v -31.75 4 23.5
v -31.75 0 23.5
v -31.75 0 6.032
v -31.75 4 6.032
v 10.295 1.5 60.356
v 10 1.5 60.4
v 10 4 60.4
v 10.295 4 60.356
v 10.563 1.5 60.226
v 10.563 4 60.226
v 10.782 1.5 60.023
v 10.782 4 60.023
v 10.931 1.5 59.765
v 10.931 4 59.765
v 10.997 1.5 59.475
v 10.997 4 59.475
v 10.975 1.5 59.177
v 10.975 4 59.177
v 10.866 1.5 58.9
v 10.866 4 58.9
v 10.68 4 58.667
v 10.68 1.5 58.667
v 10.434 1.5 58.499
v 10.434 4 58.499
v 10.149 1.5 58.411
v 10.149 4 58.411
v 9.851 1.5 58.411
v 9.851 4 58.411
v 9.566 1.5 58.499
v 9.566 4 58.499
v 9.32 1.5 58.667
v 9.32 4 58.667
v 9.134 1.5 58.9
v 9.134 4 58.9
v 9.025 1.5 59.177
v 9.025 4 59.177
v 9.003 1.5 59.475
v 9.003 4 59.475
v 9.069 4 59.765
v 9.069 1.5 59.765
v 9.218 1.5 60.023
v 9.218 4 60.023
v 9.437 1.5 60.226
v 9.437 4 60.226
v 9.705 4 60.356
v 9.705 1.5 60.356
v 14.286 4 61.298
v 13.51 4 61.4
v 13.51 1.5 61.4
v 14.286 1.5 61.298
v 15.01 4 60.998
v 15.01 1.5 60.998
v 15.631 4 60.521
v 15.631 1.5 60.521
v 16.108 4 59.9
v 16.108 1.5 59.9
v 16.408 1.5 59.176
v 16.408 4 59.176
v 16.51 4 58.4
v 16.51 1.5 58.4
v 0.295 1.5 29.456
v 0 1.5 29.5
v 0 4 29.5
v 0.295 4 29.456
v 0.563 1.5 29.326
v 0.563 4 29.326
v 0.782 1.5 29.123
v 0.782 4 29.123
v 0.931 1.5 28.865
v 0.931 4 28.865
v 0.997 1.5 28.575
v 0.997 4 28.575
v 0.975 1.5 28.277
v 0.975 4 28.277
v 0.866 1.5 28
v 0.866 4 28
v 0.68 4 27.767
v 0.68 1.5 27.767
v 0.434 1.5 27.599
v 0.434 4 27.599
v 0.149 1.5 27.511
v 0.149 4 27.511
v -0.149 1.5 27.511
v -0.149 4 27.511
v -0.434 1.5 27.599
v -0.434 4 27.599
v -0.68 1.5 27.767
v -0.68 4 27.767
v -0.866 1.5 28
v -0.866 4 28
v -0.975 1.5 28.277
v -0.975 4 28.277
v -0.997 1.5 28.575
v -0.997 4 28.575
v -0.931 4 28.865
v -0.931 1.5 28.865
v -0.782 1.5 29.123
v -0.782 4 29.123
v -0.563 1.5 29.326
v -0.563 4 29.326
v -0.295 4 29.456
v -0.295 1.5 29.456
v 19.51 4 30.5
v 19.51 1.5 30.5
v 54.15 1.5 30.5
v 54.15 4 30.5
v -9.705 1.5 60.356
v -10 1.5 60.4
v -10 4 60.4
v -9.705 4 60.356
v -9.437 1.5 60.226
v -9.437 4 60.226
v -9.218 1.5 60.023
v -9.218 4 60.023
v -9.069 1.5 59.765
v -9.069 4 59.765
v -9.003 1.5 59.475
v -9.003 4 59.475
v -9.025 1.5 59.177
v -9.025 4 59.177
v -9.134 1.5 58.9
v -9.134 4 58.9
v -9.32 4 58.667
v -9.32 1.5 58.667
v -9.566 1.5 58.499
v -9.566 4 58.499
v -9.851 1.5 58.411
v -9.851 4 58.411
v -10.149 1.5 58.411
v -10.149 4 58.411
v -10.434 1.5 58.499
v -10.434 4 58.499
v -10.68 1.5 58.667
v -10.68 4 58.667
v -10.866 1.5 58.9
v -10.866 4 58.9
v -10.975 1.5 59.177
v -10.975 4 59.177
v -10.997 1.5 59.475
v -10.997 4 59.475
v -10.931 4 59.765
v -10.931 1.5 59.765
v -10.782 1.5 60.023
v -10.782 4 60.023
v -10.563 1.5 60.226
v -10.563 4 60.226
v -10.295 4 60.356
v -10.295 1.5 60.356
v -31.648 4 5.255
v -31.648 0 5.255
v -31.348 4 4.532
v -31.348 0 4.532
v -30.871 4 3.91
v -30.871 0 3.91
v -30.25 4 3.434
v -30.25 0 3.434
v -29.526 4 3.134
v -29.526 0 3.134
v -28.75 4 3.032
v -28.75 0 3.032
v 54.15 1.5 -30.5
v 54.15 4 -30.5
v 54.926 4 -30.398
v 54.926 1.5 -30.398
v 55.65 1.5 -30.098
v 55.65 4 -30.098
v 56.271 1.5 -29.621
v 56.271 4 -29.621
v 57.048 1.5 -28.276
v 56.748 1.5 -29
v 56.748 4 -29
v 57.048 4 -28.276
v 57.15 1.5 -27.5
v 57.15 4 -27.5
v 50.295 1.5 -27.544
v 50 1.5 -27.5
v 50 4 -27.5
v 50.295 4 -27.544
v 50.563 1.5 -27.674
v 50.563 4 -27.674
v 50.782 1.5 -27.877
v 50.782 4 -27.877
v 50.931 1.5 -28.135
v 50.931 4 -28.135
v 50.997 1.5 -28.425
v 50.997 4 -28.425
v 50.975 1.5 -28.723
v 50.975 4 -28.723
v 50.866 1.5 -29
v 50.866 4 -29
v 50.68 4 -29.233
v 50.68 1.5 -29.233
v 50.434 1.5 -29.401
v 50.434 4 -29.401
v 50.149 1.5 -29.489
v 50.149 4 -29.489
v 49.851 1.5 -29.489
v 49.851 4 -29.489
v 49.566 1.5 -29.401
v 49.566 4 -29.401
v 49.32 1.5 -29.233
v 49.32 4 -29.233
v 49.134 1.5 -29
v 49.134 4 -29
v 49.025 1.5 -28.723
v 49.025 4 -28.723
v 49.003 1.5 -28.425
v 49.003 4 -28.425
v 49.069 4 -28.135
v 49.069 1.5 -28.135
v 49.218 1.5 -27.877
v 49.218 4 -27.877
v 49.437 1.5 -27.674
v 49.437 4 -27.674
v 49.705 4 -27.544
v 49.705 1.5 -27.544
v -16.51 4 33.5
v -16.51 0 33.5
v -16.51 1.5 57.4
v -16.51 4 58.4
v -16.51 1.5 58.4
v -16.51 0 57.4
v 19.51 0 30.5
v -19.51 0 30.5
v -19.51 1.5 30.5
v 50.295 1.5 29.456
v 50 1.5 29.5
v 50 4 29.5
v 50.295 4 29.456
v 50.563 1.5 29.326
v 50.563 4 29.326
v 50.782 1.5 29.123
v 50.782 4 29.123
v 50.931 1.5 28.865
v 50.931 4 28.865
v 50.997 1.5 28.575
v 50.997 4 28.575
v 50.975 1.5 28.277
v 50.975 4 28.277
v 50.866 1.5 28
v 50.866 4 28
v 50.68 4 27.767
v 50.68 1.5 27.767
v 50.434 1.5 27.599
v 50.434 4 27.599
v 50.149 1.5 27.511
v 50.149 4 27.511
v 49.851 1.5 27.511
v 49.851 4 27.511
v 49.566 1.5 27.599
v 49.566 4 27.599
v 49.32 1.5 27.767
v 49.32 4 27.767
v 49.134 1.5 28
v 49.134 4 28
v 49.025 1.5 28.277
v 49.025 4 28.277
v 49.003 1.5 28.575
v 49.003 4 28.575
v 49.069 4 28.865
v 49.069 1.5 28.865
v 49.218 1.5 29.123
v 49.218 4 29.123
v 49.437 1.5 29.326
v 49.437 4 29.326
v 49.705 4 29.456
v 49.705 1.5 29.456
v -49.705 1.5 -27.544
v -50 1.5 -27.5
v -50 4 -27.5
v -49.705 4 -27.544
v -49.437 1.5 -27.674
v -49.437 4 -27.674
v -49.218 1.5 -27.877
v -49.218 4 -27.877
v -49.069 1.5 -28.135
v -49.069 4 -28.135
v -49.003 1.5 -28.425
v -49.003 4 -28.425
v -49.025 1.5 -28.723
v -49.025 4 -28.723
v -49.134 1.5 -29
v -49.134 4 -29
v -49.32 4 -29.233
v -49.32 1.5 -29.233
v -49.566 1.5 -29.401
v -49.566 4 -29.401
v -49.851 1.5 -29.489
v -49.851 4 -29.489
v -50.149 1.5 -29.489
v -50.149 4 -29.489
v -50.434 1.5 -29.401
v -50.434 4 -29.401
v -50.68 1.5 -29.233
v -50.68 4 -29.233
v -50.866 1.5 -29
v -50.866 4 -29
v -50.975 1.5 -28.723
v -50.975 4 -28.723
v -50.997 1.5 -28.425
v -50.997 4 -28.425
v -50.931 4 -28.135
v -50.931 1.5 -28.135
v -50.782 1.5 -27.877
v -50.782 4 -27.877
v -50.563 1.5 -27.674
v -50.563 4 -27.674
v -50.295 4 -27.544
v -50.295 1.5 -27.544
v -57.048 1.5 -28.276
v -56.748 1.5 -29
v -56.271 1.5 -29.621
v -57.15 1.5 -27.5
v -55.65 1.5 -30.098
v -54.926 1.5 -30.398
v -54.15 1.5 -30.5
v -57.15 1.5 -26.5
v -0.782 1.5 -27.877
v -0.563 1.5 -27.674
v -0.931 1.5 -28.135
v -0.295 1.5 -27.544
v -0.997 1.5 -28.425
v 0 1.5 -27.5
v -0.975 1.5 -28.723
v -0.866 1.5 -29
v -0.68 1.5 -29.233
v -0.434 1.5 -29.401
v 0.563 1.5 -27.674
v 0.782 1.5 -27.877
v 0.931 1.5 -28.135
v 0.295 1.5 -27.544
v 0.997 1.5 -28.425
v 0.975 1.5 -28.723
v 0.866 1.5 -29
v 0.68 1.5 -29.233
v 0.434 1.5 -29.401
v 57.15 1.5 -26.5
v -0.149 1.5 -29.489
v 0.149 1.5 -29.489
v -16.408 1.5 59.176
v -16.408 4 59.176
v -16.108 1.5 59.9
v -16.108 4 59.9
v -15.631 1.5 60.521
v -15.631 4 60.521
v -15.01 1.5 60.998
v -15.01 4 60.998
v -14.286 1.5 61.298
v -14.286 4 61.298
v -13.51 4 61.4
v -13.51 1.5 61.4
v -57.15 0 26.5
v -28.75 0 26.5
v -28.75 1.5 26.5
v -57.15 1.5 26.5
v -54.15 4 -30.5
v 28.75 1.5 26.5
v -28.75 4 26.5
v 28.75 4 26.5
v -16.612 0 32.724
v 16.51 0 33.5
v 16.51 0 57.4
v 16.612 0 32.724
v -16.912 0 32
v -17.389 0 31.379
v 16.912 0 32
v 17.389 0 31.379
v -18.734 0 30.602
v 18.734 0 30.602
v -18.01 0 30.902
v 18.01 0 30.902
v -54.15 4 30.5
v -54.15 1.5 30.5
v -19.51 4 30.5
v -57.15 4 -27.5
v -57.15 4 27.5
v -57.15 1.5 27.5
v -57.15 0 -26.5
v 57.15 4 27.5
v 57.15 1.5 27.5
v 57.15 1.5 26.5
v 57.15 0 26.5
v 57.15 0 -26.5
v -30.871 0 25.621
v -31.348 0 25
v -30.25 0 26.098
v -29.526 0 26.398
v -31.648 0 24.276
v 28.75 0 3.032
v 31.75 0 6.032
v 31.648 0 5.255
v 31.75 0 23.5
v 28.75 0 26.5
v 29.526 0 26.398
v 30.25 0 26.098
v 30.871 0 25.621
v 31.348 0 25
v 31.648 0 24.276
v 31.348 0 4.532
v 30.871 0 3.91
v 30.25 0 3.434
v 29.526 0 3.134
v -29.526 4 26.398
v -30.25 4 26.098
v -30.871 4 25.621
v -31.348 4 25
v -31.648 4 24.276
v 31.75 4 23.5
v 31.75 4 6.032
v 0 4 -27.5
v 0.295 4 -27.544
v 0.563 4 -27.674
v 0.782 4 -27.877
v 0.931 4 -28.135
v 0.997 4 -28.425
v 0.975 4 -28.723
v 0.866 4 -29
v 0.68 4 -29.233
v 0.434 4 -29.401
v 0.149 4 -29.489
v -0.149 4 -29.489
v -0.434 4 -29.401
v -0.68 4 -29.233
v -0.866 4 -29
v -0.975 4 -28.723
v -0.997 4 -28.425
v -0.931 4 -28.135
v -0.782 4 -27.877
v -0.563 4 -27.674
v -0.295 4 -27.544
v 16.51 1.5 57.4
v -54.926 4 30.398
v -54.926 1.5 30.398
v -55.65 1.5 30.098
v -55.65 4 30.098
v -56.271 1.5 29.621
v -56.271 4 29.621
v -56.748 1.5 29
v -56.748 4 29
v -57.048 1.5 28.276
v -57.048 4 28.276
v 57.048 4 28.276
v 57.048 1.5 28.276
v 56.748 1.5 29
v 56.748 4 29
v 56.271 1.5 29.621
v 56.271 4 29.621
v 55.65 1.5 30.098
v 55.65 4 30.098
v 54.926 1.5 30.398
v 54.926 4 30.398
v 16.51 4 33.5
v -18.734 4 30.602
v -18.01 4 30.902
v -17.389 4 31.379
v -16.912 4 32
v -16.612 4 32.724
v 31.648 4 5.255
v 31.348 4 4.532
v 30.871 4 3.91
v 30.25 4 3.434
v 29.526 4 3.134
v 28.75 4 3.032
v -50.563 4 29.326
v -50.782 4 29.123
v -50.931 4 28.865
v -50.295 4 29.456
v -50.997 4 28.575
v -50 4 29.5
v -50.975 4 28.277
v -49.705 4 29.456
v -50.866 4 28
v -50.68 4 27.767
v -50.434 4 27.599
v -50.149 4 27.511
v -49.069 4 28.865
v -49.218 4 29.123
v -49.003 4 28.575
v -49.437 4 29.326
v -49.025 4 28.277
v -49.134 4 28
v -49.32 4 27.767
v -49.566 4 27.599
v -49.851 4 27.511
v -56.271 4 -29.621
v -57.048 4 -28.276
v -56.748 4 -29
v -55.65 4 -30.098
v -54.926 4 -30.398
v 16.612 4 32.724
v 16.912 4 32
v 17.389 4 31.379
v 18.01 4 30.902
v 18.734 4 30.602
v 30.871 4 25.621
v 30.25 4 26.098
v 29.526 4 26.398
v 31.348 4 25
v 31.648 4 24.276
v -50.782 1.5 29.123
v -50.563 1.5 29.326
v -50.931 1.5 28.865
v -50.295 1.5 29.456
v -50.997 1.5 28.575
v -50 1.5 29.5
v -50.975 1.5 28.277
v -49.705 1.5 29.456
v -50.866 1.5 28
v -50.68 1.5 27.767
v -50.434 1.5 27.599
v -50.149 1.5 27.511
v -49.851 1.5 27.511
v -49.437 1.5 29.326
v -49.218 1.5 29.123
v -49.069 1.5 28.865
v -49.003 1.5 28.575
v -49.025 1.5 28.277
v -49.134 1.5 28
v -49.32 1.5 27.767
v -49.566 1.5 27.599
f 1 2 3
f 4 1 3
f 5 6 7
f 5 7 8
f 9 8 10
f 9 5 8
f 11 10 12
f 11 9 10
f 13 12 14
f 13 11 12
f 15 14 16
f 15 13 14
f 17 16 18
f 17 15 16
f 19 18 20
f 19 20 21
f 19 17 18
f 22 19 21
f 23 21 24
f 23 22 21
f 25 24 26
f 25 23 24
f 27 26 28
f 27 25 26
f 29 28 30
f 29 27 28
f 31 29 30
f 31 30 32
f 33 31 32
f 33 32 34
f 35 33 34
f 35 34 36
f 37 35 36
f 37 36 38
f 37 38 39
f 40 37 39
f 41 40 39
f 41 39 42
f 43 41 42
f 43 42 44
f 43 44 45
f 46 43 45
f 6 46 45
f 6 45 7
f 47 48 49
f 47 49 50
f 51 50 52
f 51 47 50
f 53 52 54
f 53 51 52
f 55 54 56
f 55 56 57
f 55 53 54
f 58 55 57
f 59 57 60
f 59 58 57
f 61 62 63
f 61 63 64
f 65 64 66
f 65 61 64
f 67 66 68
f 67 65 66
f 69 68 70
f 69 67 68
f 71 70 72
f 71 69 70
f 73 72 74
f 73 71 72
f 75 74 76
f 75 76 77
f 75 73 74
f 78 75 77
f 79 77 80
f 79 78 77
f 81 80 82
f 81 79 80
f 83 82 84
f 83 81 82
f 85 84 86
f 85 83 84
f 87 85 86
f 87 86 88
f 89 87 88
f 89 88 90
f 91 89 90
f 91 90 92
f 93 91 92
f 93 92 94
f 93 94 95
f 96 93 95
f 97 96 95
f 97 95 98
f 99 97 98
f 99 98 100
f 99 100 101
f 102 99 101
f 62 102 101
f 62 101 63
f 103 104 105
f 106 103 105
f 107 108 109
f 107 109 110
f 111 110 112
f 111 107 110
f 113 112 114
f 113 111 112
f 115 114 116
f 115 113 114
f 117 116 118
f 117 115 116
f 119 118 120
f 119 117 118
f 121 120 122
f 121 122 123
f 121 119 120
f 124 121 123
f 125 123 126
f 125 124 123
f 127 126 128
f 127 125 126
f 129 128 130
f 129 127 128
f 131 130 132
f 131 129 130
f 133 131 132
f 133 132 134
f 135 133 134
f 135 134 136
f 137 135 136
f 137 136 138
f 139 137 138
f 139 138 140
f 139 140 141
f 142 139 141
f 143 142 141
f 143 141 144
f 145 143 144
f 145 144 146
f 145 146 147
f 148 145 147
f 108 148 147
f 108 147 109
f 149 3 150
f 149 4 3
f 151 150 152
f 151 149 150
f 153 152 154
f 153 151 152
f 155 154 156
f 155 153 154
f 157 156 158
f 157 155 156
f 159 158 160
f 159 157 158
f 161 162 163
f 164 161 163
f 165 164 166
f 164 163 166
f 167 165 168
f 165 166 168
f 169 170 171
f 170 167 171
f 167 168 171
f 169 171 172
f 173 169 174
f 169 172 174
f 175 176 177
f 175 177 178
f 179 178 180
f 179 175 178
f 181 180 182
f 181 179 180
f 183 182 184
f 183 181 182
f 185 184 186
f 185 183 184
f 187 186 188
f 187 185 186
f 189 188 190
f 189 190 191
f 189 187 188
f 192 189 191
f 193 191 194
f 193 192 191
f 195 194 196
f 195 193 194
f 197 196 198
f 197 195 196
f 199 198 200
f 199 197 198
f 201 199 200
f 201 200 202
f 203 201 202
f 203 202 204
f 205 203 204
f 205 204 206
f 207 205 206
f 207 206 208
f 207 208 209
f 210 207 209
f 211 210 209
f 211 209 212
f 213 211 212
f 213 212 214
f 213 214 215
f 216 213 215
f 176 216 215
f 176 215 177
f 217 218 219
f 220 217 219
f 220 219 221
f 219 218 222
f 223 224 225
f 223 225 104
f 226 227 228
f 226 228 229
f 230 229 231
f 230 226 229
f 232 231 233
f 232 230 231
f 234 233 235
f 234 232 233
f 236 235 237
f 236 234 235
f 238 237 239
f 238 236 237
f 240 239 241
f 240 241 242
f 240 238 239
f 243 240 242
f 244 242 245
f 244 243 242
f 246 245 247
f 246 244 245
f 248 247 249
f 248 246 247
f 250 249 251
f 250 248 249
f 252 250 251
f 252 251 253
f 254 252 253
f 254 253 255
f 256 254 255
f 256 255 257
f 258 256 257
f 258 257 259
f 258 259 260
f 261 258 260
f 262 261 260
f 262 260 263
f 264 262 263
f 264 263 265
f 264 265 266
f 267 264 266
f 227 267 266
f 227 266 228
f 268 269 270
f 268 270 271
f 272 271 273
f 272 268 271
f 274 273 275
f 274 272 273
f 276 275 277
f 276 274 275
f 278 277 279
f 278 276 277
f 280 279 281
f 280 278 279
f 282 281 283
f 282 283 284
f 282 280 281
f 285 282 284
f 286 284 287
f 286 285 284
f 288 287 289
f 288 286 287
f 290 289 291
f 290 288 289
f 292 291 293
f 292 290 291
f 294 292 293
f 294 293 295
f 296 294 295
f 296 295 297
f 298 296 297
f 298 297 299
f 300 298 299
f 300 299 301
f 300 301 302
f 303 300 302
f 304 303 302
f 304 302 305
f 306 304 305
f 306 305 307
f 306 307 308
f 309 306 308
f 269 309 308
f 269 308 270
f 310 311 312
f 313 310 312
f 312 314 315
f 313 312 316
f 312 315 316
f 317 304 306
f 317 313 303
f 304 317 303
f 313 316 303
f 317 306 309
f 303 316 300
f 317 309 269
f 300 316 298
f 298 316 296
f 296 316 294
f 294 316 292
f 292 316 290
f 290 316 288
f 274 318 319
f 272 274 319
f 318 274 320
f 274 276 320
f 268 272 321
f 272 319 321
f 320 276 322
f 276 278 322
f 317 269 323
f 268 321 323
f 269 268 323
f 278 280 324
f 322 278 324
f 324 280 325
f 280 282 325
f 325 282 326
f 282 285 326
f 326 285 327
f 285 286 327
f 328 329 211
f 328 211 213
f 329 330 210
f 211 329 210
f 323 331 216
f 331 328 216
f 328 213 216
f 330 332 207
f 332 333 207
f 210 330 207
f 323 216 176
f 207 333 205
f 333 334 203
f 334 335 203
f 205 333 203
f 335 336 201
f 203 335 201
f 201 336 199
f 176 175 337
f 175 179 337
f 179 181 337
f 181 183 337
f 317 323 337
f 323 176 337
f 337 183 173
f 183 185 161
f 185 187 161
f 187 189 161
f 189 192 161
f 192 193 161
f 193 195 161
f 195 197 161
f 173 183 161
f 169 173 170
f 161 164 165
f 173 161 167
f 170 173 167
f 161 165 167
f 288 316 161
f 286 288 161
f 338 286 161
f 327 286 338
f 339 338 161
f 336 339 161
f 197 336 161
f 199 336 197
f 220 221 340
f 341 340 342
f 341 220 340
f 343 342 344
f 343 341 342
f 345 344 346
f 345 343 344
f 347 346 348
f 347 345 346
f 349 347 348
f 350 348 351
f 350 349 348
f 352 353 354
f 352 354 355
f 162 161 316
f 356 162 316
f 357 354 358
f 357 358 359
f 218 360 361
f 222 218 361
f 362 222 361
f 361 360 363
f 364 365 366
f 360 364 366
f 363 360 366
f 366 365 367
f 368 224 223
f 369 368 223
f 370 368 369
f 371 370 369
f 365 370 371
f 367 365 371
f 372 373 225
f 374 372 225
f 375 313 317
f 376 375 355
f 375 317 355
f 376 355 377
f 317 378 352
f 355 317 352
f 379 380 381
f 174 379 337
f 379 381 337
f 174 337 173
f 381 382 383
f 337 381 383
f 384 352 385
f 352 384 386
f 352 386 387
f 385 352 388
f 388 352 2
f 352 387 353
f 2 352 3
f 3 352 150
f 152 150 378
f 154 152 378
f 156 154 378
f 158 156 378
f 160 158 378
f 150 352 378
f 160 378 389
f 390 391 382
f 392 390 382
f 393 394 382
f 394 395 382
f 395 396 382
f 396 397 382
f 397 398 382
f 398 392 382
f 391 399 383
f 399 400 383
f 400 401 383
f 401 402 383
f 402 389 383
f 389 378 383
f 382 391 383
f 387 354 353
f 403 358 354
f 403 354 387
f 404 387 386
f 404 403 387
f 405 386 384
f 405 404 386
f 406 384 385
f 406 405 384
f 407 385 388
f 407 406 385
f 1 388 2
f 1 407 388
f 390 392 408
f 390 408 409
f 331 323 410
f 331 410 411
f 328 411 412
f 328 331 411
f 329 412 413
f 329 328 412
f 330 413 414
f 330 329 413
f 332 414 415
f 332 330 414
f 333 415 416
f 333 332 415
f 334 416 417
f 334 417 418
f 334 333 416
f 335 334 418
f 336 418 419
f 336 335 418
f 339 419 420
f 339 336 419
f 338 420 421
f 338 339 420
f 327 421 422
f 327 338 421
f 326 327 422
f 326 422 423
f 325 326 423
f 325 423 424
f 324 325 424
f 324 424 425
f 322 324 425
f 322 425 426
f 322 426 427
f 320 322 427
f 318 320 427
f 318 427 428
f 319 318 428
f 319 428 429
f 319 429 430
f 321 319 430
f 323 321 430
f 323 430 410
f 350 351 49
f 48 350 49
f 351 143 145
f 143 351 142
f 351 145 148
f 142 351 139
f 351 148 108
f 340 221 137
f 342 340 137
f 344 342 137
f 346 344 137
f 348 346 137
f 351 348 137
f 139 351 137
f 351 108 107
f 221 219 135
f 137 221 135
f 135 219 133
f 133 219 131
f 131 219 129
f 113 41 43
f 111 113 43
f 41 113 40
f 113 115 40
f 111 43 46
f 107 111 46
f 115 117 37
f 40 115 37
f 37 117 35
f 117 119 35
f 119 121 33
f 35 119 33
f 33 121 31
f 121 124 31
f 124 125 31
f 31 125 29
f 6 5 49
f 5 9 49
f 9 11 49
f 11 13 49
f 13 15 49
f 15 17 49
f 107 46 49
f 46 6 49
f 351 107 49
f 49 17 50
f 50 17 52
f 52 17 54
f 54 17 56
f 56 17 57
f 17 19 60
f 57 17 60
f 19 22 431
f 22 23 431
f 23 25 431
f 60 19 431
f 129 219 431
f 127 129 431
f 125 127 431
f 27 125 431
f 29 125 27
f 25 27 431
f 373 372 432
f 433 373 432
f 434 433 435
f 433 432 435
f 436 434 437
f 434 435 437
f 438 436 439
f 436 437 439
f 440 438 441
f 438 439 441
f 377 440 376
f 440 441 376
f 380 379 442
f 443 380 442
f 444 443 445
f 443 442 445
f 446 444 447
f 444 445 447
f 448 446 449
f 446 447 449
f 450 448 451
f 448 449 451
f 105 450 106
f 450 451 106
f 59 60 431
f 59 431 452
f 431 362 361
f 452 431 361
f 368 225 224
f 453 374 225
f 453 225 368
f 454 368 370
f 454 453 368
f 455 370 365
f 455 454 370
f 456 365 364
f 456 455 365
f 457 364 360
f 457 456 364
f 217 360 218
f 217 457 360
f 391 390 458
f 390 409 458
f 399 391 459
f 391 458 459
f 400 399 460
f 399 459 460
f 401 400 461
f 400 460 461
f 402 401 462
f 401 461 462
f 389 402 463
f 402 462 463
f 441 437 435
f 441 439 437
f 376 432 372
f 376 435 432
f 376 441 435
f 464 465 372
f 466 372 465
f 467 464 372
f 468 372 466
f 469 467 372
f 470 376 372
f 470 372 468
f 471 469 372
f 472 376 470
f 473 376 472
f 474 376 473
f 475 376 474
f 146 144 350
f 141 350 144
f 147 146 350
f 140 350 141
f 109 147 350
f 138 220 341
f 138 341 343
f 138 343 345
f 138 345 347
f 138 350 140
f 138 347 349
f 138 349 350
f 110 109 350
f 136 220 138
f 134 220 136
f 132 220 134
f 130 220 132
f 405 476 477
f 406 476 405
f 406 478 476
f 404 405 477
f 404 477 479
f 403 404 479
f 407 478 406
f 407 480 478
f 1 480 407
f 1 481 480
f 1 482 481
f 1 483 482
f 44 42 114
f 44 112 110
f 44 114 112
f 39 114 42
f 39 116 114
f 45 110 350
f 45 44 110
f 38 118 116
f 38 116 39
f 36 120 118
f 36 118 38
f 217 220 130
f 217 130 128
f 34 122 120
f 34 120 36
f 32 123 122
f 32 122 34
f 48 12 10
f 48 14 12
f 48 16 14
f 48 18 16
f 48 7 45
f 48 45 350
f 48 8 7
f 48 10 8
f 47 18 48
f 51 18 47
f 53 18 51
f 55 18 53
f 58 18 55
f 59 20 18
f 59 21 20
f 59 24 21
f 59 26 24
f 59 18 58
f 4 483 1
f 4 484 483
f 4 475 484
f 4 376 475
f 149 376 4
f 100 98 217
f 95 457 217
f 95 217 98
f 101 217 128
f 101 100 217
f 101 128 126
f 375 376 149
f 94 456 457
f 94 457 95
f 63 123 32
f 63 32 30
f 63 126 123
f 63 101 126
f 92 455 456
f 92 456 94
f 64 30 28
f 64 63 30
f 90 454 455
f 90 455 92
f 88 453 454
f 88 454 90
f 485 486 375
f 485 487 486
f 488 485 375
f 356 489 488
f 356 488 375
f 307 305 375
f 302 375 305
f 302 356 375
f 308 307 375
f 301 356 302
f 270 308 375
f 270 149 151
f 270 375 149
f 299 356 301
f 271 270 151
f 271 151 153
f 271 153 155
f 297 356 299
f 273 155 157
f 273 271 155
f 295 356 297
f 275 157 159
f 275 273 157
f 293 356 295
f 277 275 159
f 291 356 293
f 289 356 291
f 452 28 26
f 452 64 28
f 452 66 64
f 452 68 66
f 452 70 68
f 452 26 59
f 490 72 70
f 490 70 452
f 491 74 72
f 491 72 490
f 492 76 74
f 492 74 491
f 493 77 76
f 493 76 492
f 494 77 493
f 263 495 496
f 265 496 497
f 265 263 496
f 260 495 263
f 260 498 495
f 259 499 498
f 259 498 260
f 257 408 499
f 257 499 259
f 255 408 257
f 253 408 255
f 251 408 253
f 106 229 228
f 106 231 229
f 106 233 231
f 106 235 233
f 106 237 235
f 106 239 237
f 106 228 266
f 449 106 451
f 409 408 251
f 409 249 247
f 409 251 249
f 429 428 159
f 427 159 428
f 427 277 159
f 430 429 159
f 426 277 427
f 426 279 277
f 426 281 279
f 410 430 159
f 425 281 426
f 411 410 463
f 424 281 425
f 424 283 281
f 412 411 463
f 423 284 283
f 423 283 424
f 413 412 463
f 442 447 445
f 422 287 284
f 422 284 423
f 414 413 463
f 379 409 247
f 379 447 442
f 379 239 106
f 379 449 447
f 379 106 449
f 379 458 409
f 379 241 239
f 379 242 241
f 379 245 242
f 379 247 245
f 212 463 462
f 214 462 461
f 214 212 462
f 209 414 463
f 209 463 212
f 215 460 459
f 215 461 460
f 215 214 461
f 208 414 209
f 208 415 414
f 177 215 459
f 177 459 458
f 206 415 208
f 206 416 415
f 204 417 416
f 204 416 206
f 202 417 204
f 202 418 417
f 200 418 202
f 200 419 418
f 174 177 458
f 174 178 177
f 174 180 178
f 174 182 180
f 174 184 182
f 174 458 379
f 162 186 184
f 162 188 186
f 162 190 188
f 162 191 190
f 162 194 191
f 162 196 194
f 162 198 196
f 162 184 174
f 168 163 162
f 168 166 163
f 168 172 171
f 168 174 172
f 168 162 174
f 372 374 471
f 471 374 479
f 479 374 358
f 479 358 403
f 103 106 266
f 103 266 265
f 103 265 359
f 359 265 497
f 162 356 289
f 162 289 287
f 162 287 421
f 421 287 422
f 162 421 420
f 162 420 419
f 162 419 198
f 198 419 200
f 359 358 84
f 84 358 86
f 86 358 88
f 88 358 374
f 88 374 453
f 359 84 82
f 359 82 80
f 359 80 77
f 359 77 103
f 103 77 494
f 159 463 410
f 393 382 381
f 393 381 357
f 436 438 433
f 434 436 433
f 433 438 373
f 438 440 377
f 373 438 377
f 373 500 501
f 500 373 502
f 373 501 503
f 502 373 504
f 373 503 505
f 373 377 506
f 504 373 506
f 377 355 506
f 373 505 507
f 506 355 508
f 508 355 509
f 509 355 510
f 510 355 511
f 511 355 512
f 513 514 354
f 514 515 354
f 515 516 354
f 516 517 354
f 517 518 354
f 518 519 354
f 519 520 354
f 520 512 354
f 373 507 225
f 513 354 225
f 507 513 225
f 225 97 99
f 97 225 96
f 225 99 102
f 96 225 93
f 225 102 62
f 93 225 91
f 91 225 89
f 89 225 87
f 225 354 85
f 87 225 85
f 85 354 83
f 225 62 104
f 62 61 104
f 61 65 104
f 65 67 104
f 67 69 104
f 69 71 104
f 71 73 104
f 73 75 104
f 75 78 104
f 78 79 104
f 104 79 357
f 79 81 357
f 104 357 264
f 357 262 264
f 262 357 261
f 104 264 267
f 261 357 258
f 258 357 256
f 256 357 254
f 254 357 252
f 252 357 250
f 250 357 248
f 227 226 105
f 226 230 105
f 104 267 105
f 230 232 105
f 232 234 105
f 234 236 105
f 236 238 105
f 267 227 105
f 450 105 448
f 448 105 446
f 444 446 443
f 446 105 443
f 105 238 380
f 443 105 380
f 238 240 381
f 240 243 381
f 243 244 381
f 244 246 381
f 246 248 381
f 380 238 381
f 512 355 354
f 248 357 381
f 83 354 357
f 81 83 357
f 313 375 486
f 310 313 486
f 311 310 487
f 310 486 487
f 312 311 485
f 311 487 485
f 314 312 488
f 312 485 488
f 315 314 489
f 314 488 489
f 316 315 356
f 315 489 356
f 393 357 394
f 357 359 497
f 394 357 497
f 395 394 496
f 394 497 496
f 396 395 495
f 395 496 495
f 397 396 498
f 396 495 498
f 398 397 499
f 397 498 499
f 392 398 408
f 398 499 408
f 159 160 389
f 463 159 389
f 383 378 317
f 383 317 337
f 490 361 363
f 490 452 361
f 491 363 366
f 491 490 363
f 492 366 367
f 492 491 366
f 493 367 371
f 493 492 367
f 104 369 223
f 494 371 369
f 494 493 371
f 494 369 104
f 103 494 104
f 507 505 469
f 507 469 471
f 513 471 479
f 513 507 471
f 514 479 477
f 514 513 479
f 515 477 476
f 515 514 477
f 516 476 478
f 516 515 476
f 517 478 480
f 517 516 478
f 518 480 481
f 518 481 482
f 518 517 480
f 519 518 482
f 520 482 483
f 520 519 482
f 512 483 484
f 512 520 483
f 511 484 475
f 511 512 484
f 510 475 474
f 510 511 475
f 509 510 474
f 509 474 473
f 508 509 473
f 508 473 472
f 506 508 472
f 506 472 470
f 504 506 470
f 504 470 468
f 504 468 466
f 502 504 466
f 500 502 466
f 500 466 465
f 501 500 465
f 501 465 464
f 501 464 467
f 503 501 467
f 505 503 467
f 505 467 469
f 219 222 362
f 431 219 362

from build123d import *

# Parameters (mm, degrees)
ESQUISSE3_W             = 63.5
ESQUISSE3_H             = 23.468408113
ESQUISSE3_R             = 1
BOSS_EXTRU_1_DEPTH      = 4
CONG_1_R                = 3
ESQUISSE3_3_W           = 114.3
ESQUISSE3_3_H           = 4
ESQUISSE3_3_R           = 1
ESQUISSE3_3_W_2         = 33.02
ENL_V_MAT_EXTRU_1_DEPTH = 1.5


with BuildPart() as part:
    # Esquisse3 → Boss.-Extru.1 (new body)
    with BuildSketch(Plane(origin=(0, 0, 0), x_dir=(1, 0, 0), z_dir=(0, 1, 0))):
        Polygon((-57.15, -30.5), (-16.51, -30.5), (-16.51, -61.4), (16.51, -61.4), (16.51, -30.5), (57.15, -30.5), (57.15, 30.5), (-57.15, 30.5), align=None)
        with Locations((0, -14.765795944)):
            Rectangle(ESQUISSE3_W, ESQUISSE3_H, mode=Mode.SUBTRACT)
        with Locations((50, 28.5)):
            Circle(ESQUISSE3_R, mode=Mode.SUBTRACT)
        with Locations((-50, 28.5)):
            Circle(ESQUISSE3_R, mode=Mode.SUBTRACT)
        with Locations((0, 28.5)):
            Circle(ESQUISSE3_R, mode=Mode.SUBTRACT)
        with Locations((0, -28.5)):
            Circle(ESQUISSE3_R, mode=Mode.SUBTRACT)
        with Locations((50, -28.5)):
            Circle(ESQUISSE3_R, mode=Mode.SUBTRACT)
        with Locations((-50, -28.5)):
            Circle(ESQUISSE3_R, mode=Mode.SUBTRACT)
        with Locations((10, -59.4)):
            Circle(ESQUISSE3_R, mode=Mode.SUBTRACT)
        with Locations((-10, -59.4)):
            Circle(ESQUISSE3_R, mode=Mode.SUBTRACT)
    extrude(amount=BOSS_EXTRU_1_DEPTH)

    # Congé1
    cong_1_edges = [part.edges().sort_by_distance(p)[0] for p in [
        (-57.15, 2, -30.5),
        (57.15, 2, -30.5),
        (57.15, 2, 30.5),
        (16.51, 2, 30.5),
        (16.51, 2, 61.4),
        (-16.51, 2, 61.4),
        (-16.51, 2, 30.5),
        (-57.15, 2, 30.5),
        (-31.75, 2, 3.031591887),
        (31.75, 2, 3.031591887),
        (31.75, 2, 26.5),
        (-31.75, 2, 26.5),
    ]]
    fillet(cong_1_edges, radius=CONG_1_R)

    # Esquisse3<3> → Enlèv. mat.-Extru.1 (cut)
    # profile 1 of 3: a face of its own
    with BuildSketch(Plane(origin=(0, 0, 0), x_dir=(1, 0, 0), z_dir=(0, 1, 0))):
        with Locations((0, -28.5)):
            Rectangle(ESQUISSE3_3_W, ESQUISSE3_3_H)
        with Locations((-50, -28.5)):
            Circle(ESQUISSE3_3_R, mode=Mode.SUBTRACT)
        with Locations((0, -28.5)):
            Circle(ESQUISSE3_3_R, mode=Mode.SUBTRACT)
        with Locations((50, -28.5)):
            Circle(ESQUISSE3_3_R, mode=Mode.SUBTRACT)
    # profile 2 of 3: a face of its own
    with BuildSketch(Plane(origin=(0, 0, 0), x_dir=(1, 0, 0), z_dir=(0, 1, 0))):
        with Locations((0, 28.5)):
            Rectangle(ESQUISSE3_3_W, ESQUISSE3_3_H)
        with Locations((-50, 28.5)):
            Circle(ESQUISSE3_3_R, mode=Mode.SUBTRACT)
        with Locations((0, 28.5)):
            Circle(ESQUISSE3_3_R, mode=Mode.SUBTRACT)
        with Locations((50, 28.5)):
            Circle(ESQUISSE3_3_R, mode=Mode.SUBTRACT)
    # profile 3 of 3: a face of its own
    with BuildSketch(Plane(origin=(0, 0, 0), x_dir=(1, 0, 0), z_dir=(0, 1, 0))):
        with Locations((0, -59.4)):
            Rectangle(ESQUISSE3_3_W_2, ESQUISSE3_3_H)
        with Locations((-10, -59.4)):
            Circle(ESQUISSE3_3_R, mode=Mode.SUBTRACT)
        with Locations((10, -59.4)):
            Circle(ESQUISSE3_3_R, mode=Mode.SUBTRACT)
    extrude(amount=ENL_V_MAT_EXTRU_1_DEPTH, mode=Mode.SUBTRACT)


solid = part.part
